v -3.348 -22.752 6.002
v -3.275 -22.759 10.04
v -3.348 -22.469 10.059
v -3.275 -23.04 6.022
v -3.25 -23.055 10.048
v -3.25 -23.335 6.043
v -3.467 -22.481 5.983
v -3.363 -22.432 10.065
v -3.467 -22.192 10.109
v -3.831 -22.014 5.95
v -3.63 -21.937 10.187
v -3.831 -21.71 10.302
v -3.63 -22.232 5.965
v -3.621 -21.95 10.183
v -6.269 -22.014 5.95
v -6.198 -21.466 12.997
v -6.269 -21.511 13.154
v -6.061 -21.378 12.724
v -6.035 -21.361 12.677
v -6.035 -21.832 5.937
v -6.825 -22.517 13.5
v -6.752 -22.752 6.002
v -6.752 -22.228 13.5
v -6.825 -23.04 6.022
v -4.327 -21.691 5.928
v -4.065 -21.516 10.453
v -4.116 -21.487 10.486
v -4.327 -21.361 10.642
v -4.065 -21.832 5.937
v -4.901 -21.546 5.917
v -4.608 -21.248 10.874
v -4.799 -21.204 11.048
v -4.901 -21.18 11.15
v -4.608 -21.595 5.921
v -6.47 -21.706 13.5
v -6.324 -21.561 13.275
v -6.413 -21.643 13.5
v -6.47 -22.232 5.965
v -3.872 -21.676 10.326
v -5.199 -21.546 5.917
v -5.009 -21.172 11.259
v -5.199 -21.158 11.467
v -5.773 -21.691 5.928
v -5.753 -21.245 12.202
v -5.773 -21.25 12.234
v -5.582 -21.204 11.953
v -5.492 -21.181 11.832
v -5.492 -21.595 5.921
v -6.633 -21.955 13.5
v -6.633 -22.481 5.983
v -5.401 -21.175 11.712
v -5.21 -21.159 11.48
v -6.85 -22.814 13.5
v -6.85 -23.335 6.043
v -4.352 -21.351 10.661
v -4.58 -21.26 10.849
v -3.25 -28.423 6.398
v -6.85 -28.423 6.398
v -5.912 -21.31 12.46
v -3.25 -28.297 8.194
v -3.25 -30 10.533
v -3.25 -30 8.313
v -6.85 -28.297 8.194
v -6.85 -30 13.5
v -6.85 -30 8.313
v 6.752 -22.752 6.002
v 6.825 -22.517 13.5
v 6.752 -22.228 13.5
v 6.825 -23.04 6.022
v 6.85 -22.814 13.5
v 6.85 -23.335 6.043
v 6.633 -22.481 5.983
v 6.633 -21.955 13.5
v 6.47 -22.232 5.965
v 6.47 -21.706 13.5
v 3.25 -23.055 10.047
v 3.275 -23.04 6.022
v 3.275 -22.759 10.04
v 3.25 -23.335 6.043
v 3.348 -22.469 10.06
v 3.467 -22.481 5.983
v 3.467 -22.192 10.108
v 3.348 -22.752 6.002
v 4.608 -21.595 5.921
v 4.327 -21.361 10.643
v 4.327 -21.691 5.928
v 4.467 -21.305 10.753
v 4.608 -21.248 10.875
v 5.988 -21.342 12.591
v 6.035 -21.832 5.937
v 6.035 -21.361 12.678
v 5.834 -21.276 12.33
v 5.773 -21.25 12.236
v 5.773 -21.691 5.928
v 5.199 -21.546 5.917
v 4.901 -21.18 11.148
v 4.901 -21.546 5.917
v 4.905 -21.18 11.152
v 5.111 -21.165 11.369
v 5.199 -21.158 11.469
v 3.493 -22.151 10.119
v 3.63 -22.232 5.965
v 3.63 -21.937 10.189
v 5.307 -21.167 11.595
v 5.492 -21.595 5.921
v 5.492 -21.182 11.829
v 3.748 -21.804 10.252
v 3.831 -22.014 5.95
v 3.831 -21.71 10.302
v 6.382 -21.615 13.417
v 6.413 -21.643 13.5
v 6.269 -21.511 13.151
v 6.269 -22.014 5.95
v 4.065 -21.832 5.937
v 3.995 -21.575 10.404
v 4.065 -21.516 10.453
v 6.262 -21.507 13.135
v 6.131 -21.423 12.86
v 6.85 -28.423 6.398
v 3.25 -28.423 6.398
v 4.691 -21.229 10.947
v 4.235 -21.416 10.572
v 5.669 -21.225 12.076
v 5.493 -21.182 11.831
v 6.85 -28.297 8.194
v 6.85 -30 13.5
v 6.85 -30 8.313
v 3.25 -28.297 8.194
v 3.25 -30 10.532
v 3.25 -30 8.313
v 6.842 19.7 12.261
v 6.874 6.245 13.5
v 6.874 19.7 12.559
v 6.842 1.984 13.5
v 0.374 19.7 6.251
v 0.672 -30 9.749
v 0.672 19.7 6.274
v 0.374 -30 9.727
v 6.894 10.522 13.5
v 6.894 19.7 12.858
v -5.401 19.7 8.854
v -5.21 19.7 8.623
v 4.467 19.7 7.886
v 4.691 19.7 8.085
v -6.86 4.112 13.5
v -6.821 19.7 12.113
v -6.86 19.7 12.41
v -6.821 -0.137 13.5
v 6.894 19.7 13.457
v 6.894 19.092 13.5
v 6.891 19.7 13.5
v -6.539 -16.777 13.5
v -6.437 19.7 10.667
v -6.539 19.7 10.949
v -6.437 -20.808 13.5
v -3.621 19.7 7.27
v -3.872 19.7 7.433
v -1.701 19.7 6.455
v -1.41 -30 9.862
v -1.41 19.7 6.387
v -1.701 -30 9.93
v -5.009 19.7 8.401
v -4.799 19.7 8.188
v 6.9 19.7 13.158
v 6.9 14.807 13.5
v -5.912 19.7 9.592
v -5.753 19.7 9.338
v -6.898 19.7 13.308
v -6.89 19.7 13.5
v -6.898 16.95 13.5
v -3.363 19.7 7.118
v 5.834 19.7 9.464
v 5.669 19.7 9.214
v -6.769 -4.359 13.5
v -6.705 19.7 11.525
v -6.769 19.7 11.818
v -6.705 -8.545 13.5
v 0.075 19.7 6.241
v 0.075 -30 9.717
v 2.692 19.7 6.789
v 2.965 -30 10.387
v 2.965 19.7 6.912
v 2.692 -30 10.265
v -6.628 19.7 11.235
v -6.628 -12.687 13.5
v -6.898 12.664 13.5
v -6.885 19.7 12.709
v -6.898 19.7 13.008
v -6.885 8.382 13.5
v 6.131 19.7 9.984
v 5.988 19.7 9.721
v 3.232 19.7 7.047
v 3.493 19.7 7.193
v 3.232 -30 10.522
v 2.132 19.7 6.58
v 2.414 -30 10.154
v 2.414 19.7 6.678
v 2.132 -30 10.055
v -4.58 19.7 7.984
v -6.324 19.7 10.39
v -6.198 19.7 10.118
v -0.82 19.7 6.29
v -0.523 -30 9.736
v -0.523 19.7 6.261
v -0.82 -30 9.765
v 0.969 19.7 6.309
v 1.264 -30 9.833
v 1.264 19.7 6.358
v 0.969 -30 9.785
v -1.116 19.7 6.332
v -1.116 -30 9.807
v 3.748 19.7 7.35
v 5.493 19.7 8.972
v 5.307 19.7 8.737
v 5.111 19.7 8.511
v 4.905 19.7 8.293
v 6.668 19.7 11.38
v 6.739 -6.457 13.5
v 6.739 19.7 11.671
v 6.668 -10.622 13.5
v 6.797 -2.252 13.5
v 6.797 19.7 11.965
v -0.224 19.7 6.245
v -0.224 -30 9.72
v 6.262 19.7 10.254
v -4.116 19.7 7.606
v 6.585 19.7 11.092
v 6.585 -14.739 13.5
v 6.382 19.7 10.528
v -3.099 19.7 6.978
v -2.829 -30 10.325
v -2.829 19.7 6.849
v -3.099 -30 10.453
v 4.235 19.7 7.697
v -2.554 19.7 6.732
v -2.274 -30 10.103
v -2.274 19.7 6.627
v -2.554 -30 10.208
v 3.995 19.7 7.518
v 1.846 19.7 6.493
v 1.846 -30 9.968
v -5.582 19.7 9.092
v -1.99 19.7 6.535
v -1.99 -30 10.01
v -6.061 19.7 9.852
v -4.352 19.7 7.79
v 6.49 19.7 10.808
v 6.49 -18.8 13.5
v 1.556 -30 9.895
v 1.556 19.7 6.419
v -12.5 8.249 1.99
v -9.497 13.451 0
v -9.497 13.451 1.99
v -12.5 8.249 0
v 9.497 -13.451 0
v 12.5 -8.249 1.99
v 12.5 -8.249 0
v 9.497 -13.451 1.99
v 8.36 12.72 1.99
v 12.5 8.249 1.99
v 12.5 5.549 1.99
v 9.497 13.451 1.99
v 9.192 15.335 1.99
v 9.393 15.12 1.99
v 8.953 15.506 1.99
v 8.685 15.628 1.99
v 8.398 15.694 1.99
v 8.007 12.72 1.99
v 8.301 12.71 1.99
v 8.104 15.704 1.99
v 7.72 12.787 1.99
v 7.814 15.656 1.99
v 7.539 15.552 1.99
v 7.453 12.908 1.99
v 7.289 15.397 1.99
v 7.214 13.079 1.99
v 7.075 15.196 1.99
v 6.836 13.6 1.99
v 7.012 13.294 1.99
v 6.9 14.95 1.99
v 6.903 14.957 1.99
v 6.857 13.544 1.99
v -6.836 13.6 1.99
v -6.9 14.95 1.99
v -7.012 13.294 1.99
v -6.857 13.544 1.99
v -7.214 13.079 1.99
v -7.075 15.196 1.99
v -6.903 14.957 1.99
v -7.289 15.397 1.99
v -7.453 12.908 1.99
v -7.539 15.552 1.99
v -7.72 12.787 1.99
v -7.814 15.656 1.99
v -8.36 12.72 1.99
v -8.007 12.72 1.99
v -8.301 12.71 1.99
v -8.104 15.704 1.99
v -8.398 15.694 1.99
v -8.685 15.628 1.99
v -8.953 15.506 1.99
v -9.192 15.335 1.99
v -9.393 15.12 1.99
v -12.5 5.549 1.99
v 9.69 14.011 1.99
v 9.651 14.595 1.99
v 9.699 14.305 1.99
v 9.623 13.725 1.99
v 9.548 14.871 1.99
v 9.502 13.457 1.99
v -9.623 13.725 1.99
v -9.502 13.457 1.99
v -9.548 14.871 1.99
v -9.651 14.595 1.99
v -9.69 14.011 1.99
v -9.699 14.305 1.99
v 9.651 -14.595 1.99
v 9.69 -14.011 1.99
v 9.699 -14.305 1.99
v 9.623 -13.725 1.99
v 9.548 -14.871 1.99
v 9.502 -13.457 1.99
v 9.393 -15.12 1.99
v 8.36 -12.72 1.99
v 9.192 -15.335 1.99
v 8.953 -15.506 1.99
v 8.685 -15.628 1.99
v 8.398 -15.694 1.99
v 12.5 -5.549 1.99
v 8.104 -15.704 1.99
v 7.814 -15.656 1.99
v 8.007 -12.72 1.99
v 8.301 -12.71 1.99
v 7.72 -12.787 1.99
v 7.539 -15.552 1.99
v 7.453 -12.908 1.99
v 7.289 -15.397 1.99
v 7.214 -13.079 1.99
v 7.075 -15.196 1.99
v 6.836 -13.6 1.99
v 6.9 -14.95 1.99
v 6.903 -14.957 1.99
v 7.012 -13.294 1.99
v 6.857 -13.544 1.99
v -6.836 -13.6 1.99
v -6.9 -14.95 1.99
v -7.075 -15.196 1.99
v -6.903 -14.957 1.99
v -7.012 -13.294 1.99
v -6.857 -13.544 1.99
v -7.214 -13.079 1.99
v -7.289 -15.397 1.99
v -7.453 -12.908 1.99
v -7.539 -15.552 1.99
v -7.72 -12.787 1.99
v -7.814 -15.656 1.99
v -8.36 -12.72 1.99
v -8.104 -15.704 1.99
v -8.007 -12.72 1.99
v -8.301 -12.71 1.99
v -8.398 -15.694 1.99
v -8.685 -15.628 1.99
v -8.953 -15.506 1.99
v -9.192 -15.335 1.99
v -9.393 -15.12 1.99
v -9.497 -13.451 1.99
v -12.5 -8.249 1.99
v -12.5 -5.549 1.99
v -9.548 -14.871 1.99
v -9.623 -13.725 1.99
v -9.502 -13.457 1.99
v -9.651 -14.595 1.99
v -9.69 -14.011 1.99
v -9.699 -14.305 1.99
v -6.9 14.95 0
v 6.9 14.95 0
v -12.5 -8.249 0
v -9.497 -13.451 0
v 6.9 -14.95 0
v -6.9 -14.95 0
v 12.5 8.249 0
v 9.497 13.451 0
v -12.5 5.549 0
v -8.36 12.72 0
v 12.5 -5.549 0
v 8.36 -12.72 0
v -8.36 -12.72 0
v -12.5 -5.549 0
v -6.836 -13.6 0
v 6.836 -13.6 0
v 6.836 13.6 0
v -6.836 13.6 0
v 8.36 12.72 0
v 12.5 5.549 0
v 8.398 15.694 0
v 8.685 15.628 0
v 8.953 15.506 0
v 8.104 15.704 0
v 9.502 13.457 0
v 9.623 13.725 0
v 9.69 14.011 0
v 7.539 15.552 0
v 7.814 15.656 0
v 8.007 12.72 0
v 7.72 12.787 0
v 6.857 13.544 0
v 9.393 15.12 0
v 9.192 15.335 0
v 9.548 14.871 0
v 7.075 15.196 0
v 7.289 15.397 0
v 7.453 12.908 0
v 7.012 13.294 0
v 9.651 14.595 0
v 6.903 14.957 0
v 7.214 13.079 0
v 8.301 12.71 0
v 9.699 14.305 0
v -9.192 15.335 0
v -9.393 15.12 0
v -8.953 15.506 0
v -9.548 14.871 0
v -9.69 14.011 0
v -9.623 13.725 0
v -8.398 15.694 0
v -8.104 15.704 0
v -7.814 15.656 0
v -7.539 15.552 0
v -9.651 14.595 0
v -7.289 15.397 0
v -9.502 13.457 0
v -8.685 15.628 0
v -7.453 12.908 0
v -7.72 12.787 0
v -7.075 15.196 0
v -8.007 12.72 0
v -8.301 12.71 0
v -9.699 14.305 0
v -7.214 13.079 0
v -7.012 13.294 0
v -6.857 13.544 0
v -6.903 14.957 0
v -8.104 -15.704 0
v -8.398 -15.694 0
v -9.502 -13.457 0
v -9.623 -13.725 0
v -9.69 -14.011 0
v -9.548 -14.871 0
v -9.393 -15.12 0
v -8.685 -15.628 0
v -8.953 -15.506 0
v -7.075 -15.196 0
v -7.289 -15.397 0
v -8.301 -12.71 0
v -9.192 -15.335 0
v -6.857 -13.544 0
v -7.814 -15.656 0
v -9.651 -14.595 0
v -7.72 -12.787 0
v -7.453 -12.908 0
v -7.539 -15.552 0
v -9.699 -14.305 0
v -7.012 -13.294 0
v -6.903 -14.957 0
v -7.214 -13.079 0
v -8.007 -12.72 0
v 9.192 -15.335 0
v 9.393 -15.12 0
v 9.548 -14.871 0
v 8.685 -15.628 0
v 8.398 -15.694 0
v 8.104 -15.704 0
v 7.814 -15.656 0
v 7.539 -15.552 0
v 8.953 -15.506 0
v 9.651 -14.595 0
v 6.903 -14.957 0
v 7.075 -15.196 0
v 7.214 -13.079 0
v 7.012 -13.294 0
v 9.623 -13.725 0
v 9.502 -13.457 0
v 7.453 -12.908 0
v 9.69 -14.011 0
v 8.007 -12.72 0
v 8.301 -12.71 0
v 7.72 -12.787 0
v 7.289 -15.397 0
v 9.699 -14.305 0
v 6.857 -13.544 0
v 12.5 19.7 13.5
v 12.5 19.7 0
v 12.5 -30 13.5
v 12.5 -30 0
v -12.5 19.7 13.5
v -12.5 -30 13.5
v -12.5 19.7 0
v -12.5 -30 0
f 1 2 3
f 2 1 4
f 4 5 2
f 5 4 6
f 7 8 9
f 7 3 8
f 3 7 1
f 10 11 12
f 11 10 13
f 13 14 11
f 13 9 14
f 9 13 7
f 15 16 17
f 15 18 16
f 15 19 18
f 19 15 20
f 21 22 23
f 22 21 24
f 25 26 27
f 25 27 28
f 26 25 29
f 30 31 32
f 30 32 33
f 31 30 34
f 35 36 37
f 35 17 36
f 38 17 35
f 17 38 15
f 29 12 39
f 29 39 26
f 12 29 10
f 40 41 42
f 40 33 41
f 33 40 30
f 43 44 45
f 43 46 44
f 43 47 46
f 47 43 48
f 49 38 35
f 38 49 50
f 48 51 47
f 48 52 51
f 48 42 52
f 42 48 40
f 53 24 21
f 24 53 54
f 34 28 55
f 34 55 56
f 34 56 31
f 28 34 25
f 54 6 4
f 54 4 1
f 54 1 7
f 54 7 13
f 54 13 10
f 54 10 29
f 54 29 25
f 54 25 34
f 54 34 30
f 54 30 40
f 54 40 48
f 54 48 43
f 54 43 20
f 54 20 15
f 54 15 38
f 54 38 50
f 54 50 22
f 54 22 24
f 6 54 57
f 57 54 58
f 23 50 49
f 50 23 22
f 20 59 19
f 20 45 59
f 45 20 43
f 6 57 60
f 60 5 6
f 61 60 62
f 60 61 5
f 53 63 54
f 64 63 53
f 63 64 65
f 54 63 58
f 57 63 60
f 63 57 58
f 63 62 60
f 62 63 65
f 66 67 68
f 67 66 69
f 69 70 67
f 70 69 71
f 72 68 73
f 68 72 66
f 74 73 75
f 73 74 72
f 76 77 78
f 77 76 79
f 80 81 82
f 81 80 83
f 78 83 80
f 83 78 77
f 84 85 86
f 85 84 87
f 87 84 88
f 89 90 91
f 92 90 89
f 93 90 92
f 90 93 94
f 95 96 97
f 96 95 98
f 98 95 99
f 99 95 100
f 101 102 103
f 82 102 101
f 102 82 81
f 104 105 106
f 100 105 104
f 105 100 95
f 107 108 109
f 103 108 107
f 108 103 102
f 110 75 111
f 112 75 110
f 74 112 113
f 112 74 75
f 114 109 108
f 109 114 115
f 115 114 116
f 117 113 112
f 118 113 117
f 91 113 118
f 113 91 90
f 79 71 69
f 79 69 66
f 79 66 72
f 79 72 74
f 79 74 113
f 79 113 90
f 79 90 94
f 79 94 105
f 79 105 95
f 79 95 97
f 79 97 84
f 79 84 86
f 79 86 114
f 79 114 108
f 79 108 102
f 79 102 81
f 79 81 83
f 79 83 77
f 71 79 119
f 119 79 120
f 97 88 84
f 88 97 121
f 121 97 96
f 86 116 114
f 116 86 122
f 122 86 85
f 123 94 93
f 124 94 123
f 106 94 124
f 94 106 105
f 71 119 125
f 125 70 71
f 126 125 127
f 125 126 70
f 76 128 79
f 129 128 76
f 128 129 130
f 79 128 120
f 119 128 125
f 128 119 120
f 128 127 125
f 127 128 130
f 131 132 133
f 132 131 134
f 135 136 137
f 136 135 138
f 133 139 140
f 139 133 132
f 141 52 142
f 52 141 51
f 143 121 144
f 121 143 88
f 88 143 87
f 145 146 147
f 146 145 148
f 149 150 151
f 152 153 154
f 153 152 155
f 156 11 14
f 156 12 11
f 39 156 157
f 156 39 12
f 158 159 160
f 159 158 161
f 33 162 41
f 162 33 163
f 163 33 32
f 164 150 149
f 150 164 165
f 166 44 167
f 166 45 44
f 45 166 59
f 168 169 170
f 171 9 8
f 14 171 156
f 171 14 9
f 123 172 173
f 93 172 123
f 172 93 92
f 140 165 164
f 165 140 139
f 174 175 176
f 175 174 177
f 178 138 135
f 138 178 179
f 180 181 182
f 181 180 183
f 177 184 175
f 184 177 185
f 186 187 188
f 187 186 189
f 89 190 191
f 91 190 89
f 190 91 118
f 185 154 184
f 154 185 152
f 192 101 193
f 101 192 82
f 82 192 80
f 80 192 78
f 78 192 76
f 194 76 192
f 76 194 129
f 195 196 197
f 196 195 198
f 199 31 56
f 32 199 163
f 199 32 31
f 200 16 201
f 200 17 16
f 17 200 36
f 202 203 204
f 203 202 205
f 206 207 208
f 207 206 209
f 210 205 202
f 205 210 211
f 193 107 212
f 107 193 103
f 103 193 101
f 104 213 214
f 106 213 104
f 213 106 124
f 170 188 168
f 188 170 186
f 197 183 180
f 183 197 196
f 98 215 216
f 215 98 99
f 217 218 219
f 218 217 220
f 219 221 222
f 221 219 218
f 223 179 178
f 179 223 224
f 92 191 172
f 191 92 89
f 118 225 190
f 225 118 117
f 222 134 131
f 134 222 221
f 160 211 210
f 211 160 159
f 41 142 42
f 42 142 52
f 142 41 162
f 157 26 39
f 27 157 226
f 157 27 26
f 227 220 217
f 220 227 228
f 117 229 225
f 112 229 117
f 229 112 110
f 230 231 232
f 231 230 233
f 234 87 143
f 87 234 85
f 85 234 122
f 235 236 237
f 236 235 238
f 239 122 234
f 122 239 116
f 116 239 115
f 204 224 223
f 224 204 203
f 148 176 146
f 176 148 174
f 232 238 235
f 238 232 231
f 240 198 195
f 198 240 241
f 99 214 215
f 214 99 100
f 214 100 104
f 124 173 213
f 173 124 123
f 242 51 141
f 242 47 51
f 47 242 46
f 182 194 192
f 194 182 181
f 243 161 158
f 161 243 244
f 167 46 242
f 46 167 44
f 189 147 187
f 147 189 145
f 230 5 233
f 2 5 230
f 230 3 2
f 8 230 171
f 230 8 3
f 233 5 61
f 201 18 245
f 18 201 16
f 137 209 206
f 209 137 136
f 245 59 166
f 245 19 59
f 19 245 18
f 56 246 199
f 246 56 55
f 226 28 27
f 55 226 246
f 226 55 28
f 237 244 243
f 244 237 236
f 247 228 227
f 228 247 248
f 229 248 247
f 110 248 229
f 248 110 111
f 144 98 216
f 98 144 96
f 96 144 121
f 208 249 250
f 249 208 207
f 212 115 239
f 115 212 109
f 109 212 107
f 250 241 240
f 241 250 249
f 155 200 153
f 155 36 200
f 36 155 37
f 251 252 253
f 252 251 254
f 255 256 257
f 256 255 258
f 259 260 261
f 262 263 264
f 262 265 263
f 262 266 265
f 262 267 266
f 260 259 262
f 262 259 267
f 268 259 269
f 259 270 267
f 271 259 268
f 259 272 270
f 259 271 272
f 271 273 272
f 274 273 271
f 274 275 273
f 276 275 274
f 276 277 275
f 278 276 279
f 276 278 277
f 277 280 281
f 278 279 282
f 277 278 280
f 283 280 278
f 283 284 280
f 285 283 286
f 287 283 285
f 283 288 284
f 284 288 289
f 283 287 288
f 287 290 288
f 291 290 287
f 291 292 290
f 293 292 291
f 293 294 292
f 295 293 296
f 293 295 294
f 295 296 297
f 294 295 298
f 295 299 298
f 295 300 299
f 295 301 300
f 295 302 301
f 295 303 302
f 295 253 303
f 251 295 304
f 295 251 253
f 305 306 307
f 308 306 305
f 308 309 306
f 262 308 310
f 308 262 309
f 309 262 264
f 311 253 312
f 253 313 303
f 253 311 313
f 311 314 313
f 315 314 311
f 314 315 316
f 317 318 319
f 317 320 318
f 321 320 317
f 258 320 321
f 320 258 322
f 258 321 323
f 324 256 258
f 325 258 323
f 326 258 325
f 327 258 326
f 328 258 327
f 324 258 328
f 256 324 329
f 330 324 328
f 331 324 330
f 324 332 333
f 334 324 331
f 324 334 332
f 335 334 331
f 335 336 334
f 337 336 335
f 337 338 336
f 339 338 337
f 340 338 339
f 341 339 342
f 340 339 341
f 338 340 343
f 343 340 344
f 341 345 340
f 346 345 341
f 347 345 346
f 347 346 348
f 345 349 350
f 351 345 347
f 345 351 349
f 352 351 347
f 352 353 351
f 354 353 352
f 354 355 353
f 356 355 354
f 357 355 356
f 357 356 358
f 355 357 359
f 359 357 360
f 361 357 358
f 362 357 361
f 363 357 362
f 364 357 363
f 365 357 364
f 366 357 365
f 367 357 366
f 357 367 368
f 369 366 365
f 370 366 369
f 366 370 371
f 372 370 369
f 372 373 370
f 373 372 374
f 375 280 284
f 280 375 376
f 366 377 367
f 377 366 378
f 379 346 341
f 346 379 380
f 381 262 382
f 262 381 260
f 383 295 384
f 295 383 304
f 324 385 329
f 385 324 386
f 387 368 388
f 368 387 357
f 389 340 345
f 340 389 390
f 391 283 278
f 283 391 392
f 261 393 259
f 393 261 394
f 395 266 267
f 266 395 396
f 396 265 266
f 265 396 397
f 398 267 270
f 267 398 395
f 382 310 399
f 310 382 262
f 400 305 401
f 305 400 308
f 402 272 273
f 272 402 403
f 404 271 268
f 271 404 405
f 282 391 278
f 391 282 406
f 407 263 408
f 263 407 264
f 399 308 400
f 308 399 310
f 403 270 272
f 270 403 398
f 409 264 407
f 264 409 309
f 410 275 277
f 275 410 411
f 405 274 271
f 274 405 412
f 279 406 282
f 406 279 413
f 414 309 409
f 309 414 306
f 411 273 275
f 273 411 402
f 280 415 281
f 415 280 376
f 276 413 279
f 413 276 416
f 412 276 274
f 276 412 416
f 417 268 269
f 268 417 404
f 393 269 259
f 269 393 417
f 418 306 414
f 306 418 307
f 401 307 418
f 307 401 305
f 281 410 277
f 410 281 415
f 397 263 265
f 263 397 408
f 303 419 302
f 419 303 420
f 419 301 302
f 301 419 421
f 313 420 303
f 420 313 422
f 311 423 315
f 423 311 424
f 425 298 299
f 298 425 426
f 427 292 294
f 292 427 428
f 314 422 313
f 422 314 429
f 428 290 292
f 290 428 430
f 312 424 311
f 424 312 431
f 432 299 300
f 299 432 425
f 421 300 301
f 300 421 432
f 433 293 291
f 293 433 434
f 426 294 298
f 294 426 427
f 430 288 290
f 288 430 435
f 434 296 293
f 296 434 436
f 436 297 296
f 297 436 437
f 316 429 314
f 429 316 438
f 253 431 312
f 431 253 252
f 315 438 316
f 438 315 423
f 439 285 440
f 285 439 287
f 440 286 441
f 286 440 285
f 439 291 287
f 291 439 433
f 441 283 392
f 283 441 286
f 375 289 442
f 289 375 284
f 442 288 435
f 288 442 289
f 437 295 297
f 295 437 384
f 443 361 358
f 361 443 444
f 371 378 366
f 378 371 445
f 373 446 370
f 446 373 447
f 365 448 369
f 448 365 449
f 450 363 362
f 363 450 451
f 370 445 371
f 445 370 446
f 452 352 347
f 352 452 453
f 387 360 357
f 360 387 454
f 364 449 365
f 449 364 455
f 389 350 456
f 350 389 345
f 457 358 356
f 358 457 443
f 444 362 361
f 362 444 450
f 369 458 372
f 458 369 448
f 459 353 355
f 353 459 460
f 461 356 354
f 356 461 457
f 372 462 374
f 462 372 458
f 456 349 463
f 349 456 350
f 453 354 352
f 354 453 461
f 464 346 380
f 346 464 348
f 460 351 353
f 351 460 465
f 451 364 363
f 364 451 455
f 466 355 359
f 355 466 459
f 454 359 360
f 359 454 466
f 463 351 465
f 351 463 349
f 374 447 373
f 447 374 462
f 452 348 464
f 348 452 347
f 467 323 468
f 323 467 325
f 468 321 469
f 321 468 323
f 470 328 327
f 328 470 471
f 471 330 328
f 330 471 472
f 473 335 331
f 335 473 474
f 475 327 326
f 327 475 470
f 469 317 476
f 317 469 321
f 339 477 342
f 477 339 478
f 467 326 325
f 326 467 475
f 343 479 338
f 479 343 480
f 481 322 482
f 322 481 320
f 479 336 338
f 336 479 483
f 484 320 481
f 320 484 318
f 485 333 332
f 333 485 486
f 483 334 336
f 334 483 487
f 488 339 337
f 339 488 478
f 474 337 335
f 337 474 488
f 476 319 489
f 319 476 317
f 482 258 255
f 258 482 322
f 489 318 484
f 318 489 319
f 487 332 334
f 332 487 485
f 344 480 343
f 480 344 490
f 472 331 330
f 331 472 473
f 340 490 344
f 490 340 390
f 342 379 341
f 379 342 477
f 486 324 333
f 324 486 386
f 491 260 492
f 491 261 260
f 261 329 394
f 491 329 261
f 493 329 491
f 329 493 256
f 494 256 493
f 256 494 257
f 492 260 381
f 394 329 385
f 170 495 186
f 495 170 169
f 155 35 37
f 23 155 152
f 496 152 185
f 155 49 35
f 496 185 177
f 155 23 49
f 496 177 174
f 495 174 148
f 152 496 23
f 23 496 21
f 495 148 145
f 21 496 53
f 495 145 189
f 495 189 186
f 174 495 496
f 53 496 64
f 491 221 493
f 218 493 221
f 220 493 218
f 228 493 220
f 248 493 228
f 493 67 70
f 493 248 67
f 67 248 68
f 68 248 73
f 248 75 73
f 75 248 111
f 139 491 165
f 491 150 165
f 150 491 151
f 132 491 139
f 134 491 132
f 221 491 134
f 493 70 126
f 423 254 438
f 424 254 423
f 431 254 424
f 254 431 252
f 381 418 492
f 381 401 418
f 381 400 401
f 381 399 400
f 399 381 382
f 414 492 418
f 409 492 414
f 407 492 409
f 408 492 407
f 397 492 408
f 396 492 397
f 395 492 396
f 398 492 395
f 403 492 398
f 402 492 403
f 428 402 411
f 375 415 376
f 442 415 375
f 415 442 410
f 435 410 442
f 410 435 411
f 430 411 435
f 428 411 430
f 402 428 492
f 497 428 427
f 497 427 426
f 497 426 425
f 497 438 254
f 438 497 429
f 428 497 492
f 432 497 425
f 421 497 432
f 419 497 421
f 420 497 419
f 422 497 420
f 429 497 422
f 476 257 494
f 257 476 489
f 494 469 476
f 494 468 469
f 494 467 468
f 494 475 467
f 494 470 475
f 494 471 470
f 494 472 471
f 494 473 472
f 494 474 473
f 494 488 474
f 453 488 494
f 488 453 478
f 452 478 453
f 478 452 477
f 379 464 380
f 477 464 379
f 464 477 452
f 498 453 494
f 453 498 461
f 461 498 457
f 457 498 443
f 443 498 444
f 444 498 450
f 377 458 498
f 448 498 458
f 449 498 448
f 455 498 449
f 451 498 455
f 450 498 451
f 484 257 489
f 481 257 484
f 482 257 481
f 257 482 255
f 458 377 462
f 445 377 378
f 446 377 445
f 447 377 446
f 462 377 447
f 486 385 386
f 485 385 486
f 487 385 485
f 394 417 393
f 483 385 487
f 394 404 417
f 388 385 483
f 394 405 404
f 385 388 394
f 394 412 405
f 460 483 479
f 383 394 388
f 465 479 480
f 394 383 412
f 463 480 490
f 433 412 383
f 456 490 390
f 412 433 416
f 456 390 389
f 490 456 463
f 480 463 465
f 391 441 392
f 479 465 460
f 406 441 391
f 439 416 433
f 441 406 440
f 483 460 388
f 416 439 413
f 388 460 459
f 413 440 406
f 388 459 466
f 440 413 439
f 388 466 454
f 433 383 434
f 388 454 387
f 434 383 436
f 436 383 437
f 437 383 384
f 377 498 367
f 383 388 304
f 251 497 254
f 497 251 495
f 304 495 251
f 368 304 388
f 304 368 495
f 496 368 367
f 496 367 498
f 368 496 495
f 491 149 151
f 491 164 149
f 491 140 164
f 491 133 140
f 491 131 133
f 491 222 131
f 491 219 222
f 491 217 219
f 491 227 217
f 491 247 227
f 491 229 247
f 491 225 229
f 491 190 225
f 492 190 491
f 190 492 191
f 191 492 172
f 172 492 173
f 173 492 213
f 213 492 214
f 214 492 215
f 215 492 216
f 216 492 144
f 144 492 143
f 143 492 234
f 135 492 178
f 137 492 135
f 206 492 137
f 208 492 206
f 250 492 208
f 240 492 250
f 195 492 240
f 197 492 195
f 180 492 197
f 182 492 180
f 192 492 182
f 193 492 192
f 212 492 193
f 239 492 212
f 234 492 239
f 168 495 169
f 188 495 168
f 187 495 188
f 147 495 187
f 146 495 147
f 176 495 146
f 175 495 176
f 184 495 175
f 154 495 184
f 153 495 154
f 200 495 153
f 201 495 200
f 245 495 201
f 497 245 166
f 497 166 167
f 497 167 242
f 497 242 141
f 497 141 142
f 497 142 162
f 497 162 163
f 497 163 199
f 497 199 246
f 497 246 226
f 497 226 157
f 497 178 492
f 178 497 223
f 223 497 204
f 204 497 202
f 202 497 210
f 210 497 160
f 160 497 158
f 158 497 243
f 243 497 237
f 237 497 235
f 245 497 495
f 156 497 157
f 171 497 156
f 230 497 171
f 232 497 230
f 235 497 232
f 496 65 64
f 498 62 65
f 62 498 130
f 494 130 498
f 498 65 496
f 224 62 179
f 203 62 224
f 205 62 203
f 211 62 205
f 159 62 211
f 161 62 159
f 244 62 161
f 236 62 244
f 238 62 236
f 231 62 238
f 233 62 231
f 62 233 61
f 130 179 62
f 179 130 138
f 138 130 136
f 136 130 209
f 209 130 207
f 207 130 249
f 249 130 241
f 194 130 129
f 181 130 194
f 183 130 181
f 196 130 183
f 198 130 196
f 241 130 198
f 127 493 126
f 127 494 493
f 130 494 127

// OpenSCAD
// file: marble_game.scad
/*
  Konstanten und Funktionen, die zu dem Murmelspiel gehören,
  also fix, bzw. durch die Geometrie des Spiels vorgegeben sind.
  Ist gedacht um über include <marble_game.scad> eingebunden zu werden.
*/

D_Kugel   = 12.8; // mm
D_Rinne   = 13.8; // mm
h_Rinne   = 5.9;  // Rinnentiefe in mm

//s_Hexagon = 2 * sqrt(60^2 - 30^2);// = 103.92 Hexagon vertikale Wiederholung
h_Hexagon_innen  = 29.8; // Schlüsselweite
r_Hexagon_innen = h_Hexagon_innen/2 * 2 / sqrt(3); // Umkreisradius

h_Hexagon_aussen = 59.7;
r_Hexagon_aussen = h_Hexagon_aussen/2 * 2 / sqrt(3); // Umkreisradius

module hexagon (h = 10, s = 59.7)
{
  r = s / 2 / cos (30);
  linear_extrude (height = h)
    polygon ([for (phi = [0:60:360]) [r*cos(phi), r*sin(phi)]]);
}

module rail_stamp(rinne_offset = 0.01)
{
// Design so, dass 0,0,0 die Mitte der Rinne,
// Außenkante Sechseck, Oberfläche ist.
// Mit rinne_offset kann der Zylinder für die Rinne
// über das Minimum hinaus verlängert werden

noff = 1;  // auch ein Offset, allerdings wird der nach hinten freigeschnitten (für moderate Neigungen)

// Die zwei Ausbuchtungen recht und links
D_bogen  = 3.6;   // Oberer Bogen
s_rand   = 1.2;   // Abstand zur Außenkante
h_tasche = 5.1;   // Höhe der Tasche
t_tasche = 9.1;   // Tiefe der Tasche zur Oberfläche
t_rand   = 7.3;   // Tiefe des Absatzes (der s_rand breite Steg) 
x_tasche = 6.5/2; // Abstand Tasche linke Seite zur Symmetrielinie

for (k = [-1:2:1])
{
  translate([k* (x_tasche + D_bogen/2), h_tasche + s_rand, -t_tasche])
    cylinder (t_tasche, d = D_bogen);

  cube_x = k * x_tasche - ((k < 0)? D_bogen : 0);
  translate([cube_x, s_rand, -t_tasche])
    cube([D_bogen, h_tasche, t_tasche]);

  translate([cube_x, +0.01 - noff, -t_rand])
    cube ([D_bogen, s_rand + noff, t_rand]);
}
translate ([0, -noff, D_Rinne/2 - h_Rinne]) // Oberfläche bei z = 0
  rotate ([-90, 0, 0])
    cylinder (h = 10 + rinne_offset + noff, d = D_Rinne);
}

module demo_rail_stamp ()
{
    difference ()
    {
      hexagon (h = 10, s = 60);

    translate ([0, 0, 1.6])
      hexagon (h = 10, s = 40); // grob innen

    for (k = [0:2])
      rotate ([0, 0, 120 * k])
        translate ([0, -30, 10])
          rail_stamp (rinne_offset = 40);
    }    
}

module base_adapter ()
{
    // Adapter zur Grundplatte, 2mm stark
    difference ()
    {
      hexagon(h = 4, s = h_Hexagon_innen);
      translate ([0, 0, -0.01])
        hexagon(h = 4.02, s = h_Hexagon_innen - 2.0);
    for (k = [0:5])
      rotate ([0, 0, 60 * k])
        translate ([r_Hexagon_innen - 0.6, 0, 2])
          cylinder (d = 5, h = 5);
    }
}
// main file
include <marble_game.scad>

$fa = 1;
$fs = 0.3;

// Kugeleinlauf unten, von -y her kommend
*translate ([0, 20, 12.1])
 rotate ([-4, 0, 0])
  rail_stamp (rinne_offset = 12.0);

difference ()
{
  w = 25;
  h = 13.5;
  translate ([-w/2, -30, 0])
    cube ([w, 49.7, h]);
  //hexagon (h = 10, s = h_Hexagon_aussen);

  rotate ([-4, 0, 0])
    translate ([0, -30, h])
      rail_stamp (rinne_offset = 50);


  // Aussparung für adapter1.FCStd (2mm stark) zur Grundplatte
  translate ([0, 0, -0.01])
  union ()
  {
    difference ()
    {
      hexagon(h = 2, s = h_Hexagon_innen + 0.1);
      translate ([0, 0, -0.01])
        hexagon(h = 2.02, s = h_Hexagon_innen - 2.0 - 0.6);
    }
  for (k = [0:5])
    rotate ([0, 0, 60 * k])
      translate ([r_Hexagon_innen - 0.8, 0, -3])
        cylinder (d = 3, h = 5);
  }
}  
